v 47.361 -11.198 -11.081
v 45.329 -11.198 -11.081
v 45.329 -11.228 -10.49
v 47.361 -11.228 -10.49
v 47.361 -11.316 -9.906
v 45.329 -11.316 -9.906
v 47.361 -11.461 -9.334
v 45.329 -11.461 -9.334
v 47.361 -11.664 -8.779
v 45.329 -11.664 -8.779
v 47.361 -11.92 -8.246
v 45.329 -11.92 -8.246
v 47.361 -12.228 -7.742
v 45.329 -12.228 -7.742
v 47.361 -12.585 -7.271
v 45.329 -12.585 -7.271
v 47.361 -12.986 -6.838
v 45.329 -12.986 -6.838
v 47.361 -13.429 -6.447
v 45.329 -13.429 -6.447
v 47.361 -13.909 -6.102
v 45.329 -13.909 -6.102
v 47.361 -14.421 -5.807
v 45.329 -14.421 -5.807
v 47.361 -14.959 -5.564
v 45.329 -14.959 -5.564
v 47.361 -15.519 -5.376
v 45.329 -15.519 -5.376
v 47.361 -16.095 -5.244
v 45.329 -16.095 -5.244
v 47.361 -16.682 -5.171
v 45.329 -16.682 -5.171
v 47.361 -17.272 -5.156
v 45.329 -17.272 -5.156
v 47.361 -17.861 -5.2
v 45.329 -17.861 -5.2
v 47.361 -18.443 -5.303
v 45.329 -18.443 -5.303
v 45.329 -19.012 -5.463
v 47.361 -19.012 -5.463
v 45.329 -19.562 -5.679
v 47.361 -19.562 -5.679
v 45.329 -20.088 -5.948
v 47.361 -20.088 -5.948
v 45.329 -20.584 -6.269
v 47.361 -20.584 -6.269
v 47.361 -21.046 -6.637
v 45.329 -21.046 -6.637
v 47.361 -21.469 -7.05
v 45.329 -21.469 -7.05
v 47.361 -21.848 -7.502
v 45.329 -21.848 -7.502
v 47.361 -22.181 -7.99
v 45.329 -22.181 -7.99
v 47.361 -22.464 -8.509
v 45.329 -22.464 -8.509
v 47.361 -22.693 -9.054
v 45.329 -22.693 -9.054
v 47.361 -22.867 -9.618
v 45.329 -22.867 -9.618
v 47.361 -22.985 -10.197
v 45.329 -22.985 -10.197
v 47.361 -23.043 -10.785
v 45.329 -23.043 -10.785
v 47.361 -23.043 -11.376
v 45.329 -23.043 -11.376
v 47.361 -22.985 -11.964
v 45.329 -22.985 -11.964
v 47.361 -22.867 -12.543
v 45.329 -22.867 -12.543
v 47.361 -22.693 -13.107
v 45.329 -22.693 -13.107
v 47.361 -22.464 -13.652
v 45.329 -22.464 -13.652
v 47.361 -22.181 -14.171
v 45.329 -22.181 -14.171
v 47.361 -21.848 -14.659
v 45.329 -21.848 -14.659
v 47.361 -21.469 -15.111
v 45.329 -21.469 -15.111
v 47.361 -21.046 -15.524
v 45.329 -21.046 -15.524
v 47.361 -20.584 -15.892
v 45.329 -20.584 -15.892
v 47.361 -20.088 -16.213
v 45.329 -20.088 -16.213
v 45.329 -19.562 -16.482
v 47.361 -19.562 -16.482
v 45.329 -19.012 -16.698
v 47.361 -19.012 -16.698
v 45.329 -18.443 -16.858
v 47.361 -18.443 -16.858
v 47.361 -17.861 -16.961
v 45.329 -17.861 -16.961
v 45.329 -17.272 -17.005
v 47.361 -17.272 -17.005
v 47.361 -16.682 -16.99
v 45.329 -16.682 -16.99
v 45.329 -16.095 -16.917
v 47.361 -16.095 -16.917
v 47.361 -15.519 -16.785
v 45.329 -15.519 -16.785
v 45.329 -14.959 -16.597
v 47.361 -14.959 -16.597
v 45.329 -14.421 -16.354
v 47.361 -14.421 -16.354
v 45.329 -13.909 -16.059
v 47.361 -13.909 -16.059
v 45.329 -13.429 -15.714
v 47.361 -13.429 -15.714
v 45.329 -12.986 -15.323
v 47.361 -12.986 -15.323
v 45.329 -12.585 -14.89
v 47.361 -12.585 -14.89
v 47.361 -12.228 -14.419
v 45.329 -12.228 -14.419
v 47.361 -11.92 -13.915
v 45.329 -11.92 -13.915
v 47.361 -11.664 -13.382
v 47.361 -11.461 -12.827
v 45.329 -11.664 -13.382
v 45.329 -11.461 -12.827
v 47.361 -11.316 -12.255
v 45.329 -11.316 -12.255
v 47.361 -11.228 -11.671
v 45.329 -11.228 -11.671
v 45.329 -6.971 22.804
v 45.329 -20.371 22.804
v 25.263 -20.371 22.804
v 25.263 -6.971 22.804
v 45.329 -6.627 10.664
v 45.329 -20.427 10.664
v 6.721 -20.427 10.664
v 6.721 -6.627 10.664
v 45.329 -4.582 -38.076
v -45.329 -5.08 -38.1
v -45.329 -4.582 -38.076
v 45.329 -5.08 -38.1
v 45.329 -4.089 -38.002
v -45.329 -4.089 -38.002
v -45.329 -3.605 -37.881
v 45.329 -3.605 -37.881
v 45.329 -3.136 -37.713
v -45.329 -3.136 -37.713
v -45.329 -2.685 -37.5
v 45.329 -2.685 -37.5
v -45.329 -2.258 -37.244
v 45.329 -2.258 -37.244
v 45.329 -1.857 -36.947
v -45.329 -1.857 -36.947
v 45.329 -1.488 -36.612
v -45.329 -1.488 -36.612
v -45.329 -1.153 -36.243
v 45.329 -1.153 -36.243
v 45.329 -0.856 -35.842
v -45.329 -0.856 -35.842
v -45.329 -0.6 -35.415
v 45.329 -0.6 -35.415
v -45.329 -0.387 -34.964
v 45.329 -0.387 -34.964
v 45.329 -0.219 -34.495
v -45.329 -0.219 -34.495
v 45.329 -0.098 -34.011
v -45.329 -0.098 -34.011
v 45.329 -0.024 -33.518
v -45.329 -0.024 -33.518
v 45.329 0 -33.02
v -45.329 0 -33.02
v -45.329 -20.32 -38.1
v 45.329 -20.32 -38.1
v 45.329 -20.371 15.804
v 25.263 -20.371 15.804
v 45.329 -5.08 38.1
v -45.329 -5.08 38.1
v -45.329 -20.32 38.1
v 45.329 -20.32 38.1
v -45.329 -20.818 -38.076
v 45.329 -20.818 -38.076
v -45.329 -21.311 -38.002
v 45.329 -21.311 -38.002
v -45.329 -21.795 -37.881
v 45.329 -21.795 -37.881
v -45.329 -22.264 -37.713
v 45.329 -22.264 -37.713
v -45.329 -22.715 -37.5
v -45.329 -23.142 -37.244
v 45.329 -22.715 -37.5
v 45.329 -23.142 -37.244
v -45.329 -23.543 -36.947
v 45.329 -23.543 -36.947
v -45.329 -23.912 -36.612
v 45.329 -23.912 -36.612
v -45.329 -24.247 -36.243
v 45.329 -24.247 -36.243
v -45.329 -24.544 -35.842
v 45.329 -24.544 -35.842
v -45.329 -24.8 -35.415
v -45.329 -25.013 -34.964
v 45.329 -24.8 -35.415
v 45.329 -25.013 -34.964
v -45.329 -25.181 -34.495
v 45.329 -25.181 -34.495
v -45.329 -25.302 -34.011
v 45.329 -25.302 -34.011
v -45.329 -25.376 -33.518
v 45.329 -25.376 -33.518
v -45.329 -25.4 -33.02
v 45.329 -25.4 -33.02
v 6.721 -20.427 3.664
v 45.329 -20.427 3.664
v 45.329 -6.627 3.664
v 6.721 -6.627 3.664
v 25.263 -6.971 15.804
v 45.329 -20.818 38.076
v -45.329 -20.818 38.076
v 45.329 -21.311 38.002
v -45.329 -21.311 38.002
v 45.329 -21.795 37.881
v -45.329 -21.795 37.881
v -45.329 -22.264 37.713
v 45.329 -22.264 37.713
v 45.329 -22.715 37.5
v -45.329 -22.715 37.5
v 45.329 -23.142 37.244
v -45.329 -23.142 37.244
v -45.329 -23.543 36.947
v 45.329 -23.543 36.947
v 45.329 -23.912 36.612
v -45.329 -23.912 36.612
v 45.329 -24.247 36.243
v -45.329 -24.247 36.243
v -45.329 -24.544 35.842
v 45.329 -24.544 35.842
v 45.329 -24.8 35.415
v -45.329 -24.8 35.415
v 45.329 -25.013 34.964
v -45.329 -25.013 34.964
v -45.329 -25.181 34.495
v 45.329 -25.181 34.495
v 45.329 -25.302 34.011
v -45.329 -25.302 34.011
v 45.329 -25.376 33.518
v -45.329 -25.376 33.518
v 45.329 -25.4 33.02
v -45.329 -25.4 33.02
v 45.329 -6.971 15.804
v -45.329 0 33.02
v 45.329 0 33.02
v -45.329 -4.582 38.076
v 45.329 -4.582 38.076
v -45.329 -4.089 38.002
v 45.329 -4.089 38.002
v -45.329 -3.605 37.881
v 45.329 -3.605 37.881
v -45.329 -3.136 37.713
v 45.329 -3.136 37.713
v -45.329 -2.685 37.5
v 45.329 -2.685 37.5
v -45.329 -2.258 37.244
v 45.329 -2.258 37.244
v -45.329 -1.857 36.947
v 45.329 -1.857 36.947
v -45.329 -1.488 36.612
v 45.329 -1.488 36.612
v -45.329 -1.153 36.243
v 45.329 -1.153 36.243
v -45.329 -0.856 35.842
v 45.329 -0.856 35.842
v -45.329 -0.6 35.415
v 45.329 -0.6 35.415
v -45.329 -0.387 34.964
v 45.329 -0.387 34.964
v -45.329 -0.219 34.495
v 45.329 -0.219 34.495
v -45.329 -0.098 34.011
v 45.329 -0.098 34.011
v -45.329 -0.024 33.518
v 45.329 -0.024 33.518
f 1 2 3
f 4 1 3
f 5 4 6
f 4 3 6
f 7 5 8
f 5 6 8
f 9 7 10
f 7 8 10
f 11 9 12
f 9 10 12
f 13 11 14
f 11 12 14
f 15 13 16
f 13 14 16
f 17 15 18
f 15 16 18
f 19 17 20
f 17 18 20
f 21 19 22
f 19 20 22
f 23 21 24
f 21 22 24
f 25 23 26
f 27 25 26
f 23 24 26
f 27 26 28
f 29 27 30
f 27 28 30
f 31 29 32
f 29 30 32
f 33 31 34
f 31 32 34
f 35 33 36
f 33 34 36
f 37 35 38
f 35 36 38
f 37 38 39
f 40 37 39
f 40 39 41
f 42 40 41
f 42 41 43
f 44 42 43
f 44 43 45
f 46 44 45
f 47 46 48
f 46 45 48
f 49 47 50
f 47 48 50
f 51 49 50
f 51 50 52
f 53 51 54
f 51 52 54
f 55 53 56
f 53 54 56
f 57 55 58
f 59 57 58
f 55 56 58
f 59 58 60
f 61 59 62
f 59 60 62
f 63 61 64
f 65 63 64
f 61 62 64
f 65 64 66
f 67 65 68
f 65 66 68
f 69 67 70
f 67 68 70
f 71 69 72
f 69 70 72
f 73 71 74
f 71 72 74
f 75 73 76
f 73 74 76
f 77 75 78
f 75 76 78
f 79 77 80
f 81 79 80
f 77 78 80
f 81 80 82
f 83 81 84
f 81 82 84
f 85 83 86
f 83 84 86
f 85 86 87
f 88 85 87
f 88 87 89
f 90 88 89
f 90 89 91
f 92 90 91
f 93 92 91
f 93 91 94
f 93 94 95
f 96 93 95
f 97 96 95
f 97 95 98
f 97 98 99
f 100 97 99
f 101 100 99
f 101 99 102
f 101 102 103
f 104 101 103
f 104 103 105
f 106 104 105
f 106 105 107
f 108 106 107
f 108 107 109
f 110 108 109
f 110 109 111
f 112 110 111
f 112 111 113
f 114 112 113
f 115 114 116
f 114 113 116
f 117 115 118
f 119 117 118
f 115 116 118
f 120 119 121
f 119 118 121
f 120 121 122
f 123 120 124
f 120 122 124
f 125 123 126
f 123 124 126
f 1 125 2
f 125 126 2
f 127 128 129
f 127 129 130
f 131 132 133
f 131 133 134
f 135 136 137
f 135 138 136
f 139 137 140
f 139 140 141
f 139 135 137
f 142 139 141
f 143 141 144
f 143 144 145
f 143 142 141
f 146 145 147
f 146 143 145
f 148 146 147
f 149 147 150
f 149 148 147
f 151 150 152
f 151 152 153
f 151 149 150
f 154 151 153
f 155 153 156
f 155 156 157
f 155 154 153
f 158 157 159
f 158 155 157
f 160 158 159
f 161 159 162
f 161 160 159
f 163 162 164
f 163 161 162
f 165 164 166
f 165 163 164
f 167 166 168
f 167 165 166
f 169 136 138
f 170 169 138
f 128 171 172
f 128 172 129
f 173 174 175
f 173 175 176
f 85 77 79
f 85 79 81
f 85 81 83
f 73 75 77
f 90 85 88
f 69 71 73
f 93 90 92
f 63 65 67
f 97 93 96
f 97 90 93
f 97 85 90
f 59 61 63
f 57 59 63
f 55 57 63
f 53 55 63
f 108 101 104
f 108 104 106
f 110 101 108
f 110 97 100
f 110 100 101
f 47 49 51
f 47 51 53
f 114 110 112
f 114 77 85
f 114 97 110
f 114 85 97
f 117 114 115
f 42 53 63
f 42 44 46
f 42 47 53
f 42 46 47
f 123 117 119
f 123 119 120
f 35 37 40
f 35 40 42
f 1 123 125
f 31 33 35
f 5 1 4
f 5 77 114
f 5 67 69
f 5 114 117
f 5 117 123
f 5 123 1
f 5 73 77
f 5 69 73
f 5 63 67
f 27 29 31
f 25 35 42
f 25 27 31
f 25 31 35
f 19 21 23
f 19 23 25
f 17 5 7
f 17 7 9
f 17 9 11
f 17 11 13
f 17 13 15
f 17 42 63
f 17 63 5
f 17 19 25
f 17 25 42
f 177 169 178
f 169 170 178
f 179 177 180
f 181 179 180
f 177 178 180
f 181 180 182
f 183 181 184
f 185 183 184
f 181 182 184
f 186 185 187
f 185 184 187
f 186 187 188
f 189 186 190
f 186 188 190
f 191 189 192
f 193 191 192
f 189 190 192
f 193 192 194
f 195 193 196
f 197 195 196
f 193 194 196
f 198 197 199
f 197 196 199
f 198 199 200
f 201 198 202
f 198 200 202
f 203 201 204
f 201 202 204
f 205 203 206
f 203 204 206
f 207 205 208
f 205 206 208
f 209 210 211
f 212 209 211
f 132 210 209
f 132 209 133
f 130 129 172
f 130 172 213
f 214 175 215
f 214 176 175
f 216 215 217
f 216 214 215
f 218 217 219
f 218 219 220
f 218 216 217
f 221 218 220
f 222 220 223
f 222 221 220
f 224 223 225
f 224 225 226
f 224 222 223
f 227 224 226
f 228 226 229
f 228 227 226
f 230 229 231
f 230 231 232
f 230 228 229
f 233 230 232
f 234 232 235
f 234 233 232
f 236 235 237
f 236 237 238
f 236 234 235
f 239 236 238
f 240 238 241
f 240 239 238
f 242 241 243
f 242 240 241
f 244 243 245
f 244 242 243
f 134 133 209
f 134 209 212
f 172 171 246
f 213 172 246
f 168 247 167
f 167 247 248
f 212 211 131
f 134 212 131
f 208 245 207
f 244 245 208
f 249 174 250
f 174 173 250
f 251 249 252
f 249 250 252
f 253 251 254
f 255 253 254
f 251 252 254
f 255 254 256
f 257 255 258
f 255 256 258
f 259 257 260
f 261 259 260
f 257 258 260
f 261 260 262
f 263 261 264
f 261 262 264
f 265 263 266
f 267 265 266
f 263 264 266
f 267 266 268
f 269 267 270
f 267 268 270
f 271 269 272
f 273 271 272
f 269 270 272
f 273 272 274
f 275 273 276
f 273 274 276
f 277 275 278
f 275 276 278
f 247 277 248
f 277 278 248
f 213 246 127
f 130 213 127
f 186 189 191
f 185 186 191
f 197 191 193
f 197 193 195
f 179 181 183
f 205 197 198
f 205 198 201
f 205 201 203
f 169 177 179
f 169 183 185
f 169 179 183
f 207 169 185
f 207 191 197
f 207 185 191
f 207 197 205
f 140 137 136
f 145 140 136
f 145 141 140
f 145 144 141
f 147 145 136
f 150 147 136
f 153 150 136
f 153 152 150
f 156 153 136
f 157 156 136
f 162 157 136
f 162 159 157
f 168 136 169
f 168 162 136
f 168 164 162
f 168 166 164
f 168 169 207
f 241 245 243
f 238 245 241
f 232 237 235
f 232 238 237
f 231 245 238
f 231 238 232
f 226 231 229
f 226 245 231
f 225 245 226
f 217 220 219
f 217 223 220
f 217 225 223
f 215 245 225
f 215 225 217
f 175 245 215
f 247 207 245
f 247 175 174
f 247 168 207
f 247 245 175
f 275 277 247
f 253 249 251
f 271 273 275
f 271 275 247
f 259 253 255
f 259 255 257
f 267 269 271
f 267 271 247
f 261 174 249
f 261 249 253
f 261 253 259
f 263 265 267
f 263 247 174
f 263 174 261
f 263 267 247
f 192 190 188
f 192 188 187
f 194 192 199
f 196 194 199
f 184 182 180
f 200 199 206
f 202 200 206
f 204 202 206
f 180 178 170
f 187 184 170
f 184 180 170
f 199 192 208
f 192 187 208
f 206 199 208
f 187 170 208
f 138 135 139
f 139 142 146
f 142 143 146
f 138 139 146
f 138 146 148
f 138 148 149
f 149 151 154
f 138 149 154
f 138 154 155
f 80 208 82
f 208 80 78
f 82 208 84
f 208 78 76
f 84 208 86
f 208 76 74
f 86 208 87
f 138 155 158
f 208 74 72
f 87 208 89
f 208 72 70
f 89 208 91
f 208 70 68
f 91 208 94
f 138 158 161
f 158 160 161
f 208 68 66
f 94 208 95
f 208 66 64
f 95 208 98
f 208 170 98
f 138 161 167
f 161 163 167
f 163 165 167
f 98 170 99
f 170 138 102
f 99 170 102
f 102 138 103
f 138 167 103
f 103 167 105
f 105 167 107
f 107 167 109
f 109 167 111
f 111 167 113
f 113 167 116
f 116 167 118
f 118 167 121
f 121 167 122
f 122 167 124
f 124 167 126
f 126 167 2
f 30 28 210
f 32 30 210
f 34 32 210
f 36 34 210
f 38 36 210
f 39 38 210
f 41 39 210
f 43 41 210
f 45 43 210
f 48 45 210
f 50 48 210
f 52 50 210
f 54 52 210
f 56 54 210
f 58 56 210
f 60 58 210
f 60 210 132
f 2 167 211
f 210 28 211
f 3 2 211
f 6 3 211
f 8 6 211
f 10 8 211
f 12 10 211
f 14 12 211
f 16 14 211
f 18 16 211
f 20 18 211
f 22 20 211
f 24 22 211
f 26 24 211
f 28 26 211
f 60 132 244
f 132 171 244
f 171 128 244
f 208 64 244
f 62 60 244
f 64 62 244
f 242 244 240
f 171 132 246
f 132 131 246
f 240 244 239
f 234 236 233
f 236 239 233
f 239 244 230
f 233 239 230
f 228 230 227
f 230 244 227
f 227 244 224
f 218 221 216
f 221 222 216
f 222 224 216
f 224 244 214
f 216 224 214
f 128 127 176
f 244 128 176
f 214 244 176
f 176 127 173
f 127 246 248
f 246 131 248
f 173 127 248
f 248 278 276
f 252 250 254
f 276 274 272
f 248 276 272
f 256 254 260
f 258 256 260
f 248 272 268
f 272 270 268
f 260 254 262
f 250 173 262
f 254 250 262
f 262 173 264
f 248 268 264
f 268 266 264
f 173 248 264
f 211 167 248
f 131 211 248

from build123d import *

# Parameters (mm, degrees)
F0_W     = 90.658814
F0_H     = 76.2
F1_DEPTH = 25.4
F2_R     = 5.08
F3_W     = 13.8
F3_H     = 7
F4_DEPTH = 38.608
F5_W     = 13.4
F5_H     = 7
F6_DEPTH = 20.066
F7_R     = 5.926284
F8_DEPTH = 2.032


with BuildPart() as f1:
    # F0 (on Front) → F1 (new body)
    with BuildSketch(Plane.XZ):
        Rectangle(F0_W, F0_H)
    extrude(amount=F1_DEPTH)

    # F2
    f2_edges = [f1.edges().sort_by_distance(p)[0] for p in [
        (0, -25.4, 38.1),
        (0, 0, 38.1),
        (0, 0, -38.1),
        (0, -25.4, -38.1),
    ]]
    fillet(f2_edges, radius=F2_R)

    # F3 (on face) → F4 (cut)
    with BuildSketch(Plane.YZ.offset(45.329407)):
        with Locations((-13.526871, 7.164022)):
            Rectangle(F3_W, F3_H)
    extrude(amount=-F4_DEPTH, mode=Mode.SUBTRACT)

    # F5 (on face) → F6 (cut)
    with BuildSketch(Plane.YZ.offset(45.329407)):
        with Locations((-13.670774, 19.304139)):
            Rectangle(F5_W, F5_H)
    extrude(amount=-F6_DEPTH, mode=Mode.SUBTRACT)

    # F7 (on face) → F8 (join)
    with BuildSketch(Plane.YZ.offset(45.329407)):
        with Locations((-17.124441, -11.080521)):
            Circle(F7_R)
    extrude(amount=F8_DEPTH)


solid = f1.part
